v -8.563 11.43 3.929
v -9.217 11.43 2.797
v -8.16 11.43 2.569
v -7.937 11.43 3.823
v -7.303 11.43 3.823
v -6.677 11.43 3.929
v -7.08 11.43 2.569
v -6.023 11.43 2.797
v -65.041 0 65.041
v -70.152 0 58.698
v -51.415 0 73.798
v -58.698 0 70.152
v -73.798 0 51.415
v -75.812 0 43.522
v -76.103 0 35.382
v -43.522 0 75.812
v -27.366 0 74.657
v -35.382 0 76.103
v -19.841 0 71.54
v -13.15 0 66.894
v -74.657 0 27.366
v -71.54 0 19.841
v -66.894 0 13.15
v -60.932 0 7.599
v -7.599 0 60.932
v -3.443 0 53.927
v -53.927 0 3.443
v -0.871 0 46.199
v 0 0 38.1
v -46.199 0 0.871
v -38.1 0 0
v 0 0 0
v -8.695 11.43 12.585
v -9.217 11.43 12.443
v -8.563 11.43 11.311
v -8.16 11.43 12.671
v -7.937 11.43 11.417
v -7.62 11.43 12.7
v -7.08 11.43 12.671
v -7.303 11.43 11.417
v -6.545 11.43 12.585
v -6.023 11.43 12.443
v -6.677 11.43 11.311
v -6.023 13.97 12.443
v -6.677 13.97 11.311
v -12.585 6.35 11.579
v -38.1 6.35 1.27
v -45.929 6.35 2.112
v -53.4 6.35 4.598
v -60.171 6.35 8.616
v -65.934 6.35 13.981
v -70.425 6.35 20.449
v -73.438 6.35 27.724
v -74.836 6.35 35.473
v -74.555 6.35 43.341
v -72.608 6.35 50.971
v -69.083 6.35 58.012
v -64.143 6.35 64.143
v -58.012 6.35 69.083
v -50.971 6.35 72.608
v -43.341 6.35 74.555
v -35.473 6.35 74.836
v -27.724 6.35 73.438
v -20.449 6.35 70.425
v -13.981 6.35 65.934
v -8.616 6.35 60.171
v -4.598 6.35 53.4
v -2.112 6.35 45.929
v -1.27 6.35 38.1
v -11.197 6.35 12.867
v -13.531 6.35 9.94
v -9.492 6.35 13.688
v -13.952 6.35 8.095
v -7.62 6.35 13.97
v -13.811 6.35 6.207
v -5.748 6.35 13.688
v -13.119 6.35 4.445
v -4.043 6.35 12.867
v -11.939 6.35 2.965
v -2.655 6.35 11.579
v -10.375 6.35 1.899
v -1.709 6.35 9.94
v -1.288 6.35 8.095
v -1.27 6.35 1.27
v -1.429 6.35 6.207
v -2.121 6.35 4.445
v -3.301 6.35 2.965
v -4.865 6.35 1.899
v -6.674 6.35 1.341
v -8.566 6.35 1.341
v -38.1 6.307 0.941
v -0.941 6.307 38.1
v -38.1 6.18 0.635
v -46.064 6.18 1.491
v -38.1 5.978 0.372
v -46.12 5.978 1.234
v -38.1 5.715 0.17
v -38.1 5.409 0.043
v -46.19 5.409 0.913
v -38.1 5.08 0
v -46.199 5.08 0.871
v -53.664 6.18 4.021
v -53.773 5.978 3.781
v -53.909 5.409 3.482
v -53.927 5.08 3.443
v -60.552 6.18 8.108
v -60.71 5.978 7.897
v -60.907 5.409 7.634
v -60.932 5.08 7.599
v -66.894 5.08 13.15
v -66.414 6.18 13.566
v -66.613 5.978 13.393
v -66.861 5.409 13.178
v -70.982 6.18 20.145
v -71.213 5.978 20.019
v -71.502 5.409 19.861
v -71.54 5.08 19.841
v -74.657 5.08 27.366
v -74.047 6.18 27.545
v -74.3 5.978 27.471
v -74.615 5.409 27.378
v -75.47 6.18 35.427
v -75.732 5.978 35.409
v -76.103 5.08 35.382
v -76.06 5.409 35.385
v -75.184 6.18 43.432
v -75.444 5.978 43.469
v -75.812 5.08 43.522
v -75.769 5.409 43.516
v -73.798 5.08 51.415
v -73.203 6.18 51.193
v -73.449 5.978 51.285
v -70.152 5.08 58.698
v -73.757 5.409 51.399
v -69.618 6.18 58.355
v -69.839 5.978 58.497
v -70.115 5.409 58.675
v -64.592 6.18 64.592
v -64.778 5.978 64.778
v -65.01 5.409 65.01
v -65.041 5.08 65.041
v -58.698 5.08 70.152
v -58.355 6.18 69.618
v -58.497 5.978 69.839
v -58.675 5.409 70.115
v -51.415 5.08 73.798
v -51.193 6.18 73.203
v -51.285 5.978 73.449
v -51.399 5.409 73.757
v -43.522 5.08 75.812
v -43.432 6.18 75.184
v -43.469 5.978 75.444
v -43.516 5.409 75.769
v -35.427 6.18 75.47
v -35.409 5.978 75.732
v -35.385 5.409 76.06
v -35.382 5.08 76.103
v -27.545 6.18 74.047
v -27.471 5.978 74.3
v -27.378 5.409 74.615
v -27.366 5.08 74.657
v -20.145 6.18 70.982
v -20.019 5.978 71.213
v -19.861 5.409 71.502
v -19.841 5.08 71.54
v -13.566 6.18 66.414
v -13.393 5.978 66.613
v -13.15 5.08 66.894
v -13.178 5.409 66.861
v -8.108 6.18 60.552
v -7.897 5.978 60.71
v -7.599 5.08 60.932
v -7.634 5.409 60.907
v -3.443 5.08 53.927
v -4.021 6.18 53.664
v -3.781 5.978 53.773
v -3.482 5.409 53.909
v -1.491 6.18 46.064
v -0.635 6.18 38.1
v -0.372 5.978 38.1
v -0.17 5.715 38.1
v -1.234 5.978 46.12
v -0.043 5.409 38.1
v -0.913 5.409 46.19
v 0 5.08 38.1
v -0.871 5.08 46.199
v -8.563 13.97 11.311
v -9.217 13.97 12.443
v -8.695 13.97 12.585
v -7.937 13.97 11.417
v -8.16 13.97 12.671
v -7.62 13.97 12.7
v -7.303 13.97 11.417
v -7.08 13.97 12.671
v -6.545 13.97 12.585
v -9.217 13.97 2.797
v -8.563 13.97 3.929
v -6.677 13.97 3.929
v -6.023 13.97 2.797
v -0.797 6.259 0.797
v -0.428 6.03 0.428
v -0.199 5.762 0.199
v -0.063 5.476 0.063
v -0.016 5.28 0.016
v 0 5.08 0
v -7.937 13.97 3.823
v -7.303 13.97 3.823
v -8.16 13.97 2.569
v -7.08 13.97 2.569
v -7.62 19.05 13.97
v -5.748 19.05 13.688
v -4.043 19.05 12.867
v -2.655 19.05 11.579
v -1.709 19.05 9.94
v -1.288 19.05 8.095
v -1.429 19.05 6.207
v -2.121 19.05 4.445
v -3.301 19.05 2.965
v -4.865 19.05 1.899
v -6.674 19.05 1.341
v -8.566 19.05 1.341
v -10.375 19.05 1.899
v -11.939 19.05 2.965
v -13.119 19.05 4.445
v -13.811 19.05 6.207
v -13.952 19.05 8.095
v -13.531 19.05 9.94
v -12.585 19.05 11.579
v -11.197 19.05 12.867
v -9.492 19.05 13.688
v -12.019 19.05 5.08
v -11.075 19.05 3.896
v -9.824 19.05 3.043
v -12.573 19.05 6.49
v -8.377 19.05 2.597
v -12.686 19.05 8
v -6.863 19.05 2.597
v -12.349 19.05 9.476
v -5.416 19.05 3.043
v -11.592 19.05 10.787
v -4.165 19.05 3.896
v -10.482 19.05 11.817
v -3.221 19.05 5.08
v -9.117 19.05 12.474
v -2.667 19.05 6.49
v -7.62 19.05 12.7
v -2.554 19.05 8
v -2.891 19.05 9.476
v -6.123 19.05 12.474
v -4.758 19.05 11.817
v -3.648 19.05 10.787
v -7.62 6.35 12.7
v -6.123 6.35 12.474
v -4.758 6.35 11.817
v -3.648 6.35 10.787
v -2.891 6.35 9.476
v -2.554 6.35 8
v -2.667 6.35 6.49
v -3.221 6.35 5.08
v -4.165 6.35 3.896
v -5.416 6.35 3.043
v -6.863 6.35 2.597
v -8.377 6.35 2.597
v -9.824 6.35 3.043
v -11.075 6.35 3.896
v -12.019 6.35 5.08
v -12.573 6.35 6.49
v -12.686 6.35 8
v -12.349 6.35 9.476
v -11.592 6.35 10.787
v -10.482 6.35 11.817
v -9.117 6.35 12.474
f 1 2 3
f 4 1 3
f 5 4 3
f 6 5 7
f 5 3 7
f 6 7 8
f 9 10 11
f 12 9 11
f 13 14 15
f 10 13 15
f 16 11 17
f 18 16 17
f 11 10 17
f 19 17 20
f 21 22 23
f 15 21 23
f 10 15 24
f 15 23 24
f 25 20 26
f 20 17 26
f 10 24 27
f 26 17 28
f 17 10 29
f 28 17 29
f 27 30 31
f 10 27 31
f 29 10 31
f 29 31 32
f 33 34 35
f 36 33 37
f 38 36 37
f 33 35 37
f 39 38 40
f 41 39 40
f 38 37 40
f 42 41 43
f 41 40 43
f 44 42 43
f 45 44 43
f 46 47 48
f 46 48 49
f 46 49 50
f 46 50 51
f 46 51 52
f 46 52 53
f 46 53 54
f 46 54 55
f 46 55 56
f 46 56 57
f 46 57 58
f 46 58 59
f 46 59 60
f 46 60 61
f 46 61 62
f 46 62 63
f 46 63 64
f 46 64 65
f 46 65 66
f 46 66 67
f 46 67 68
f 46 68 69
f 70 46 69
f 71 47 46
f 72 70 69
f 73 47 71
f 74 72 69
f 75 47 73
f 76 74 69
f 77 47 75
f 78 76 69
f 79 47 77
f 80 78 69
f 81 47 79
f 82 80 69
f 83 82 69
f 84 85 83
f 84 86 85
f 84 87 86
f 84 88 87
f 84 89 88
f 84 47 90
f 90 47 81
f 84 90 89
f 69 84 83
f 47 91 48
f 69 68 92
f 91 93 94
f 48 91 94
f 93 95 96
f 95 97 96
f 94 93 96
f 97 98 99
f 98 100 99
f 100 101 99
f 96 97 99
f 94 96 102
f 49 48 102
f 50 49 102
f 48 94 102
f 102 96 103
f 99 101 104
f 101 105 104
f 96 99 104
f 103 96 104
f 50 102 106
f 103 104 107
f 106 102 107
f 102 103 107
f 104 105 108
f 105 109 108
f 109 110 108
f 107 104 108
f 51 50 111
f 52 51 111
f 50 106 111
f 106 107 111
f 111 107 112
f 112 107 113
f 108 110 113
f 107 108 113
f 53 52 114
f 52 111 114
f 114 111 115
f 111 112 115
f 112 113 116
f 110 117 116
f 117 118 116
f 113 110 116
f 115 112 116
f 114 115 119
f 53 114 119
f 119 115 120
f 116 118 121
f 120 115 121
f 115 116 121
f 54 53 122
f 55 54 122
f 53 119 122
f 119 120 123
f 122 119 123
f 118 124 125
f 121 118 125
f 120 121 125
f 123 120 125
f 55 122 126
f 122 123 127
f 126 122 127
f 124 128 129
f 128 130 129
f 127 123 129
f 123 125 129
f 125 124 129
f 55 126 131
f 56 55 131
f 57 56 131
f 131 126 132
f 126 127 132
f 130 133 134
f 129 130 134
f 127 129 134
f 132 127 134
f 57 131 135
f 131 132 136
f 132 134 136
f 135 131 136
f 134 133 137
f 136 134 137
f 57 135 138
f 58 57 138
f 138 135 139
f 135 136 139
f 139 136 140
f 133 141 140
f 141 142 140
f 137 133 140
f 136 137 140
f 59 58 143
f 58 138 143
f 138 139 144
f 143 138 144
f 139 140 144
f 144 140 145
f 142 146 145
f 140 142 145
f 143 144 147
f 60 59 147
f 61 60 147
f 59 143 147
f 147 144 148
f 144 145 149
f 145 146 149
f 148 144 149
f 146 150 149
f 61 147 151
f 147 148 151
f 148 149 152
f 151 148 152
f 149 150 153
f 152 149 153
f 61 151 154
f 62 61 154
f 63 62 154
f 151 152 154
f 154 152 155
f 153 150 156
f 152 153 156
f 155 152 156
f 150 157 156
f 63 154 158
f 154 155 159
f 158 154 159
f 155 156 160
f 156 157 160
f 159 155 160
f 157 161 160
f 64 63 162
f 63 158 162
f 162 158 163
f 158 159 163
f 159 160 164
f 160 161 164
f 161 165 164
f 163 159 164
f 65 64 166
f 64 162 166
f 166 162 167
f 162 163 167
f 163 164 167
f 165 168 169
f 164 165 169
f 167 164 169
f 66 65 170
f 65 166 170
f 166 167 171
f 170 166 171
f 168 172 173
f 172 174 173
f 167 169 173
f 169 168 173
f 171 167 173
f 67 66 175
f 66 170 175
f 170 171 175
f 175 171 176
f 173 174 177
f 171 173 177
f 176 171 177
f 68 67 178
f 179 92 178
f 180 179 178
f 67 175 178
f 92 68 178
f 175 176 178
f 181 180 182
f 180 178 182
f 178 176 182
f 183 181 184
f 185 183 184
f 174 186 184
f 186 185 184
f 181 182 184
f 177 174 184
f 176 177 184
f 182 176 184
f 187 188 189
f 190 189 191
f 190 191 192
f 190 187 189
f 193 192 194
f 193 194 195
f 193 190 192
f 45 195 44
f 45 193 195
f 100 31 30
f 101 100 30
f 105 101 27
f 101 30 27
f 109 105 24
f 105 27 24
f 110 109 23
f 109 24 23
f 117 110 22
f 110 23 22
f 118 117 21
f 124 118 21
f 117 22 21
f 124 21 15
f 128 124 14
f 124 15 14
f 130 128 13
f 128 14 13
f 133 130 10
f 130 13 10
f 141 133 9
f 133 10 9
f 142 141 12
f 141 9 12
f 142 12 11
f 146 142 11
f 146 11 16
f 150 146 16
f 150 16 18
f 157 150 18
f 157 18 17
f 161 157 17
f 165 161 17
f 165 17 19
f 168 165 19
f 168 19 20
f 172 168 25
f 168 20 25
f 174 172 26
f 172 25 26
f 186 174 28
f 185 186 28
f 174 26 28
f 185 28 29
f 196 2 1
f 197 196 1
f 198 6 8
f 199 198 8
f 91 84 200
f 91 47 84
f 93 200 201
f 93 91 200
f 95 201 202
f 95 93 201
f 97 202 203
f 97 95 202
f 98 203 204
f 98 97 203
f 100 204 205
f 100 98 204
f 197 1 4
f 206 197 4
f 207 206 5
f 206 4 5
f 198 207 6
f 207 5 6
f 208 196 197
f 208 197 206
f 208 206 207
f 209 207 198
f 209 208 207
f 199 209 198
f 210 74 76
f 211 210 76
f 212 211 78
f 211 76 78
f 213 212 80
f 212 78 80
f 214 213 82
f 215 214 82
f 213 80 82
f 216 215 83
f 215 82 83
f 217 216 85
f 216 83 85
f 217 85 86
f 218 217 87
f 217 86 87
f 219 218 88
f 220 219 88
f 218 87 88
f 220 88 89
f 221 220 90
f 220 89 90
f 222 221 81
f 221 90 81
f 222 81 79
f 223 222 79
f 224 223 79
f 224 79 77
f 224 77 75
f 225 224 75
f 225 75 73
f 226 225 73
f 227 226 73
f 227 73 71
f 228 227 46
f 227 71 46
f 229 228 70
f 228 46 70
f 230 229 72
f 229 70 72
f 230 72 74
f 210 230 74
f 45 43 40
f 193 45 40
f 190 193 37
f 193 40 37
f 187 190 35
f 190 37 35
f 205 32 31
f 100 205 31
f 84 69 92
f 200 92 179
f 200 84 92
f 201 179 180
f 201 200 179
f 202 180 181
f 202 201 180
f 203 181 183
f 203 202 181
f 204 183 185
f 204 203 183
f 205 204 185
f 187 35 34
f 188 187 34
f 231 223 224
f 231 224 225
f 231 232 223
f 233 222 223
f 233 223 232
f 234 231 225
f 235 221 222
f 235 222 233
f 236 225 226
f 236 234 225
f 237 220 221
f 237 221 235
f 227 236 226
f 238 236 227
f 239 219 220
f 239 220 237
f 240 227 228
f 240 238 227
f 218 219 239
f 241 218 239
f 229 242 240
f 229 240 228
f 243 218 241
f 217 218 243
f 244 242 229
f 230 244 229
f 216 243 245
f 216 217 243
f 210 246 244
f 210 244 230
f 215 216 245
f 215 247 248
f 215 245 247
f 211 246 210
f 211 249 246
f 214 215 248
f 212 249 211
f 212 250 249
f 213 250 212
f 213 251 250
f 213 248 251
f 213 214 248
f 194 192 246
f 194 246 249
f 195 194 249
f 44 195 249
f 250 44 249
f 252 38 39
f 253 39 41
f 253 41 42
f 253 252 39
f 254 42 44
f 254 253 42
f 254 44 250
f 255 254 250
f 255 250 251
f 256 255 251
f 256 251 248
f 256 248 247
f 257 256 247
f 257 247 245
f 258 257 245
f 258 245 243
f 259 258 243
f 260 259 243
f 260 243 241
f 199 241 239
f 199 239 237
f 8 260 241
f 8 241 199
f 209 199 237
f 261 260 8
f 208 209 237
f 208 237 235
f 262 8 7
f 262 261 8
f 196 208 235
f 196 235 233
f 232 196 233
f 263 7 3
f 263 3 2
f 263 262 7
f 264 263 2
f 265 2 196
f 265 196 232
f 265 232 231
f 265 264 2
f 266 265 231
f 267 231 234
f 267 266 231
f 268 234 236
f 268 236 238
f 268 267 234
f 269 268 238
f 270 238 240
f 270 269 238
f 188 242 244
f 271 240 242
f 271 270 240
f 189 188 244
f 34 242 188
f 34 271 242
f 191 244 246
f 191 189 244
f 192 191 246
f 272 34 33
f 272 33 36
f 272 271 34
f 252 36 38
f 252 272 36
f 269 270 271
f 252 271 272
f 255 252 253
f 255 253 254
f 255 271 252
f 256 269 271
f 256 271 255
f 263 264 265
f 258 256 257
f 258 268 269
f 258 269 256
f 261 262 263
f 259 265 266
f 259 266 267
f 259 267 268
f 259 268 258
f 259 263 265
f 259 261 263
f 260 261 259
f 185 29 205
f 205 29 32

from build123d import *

# Parameters (mm, degrees)
BOSS_EXTRUDE1_DEPTH = 6.35
SKETCH2_R           = 6.35
SKETCH2_R_2         = 5.08
BOSS_EXTRUDE2_DEPTH = 12.7
BOSS_EXTRUDE3_START = 5.08
BOSS_EXTRUDE3_DEPTH = 2.54
FILLET1_R           = 1.27


with BuildPart() as part:
    # Sketch1 → Boss-Extrude1 (new body)
    with BuildSketch(Plane(origin=(0, 0, 0), x_dir=(1, 0, 0), z_dir=(0, 1, 0))):
        with BuildLine():
            Line((0, 0), (-38.1, 0))
            ThreePointArc((-38.1, 0), (-65.040768363, -65.040768363), (0, -38.1))
            Line((0, -38.1), (0, 0))
        make_face()
    extrude(amount=BOSS_EXTRUDE1_DEPTH)

    # Sketch2 → Boss-Extrude2 (add)
    with BuildSketch(Plane(origin=(0, 6.35, 0), x_dir=(1, 0, 0), z_dir=(0, 1, 0))):
        with Locations(Location((-7.62, -7.62, 0), (0, 0, 270))):
            Circle(SKETCH2_R)
        with Locations(Location((-7.62, -7.62, 0), (0, 0, 270))):
            Circle(SKETCH2_R_2, mode=Mode.SUBTRACT)
    extrude(amount=BOSS_EXTRUDE2_DEPTH)

    # Sketch3 → Boss-Extrude3 (add)
    with BuildSketch(Plane(origin=(0, 6.35, 0), x_dir=(1, 0, 0), z_dir=(0, 1, 0)).offset(BOSS_EXTRUDE3_START)):
        with BuildLine():
            Line((-9.216562761, -2.797408648), (-8.563437239, -3.928655235))
            ThreePointArc((-8.563437239, -3.928655235), (-7.62, -3.81), (-6.676562761, -3.928655235))
            Line((-6.676562761, -3.928655235), (-6.023437239, -2.797408648))
            ThreePointArc((-6.023437239, -2.797408648), (-7.62, -2.54), (-9.216562761, -2.797408648))
        make_face()
        with BuildLine():
            ThreePointArc((-6.676562761, -11.311344765), (-7.62, -11.43), (-8.563437239, -11.311344765))
            Line((-8.563437239, -11.311344765), (-9.216562761, -12.442591352))
            ThreePointArc((-9.216562761, -12.442591352), (-7.62, -12.7), (-6.023437239, -12.442591352))
            Line((-6.023437239, -12.442591352), (-6.676562761, -11.311344765))
        make_face()
    extrude(amount=BOSS_EXTRUDE3_DEPTH)

    # Fillet1
    fillet1_edges = [part.edges().sort_by_distance(p)[0] for p in [
        (-65.040768363, 6.35, 65.040768363),
        (0, 6.35, 19.05),
        (-19.05, 6.35, 0),
    ]]
    fillet(fillet1_edges, radius=FILLET1_R - 0.0001)  # a hair under: the kernel refuses the full size


solid = part.part
